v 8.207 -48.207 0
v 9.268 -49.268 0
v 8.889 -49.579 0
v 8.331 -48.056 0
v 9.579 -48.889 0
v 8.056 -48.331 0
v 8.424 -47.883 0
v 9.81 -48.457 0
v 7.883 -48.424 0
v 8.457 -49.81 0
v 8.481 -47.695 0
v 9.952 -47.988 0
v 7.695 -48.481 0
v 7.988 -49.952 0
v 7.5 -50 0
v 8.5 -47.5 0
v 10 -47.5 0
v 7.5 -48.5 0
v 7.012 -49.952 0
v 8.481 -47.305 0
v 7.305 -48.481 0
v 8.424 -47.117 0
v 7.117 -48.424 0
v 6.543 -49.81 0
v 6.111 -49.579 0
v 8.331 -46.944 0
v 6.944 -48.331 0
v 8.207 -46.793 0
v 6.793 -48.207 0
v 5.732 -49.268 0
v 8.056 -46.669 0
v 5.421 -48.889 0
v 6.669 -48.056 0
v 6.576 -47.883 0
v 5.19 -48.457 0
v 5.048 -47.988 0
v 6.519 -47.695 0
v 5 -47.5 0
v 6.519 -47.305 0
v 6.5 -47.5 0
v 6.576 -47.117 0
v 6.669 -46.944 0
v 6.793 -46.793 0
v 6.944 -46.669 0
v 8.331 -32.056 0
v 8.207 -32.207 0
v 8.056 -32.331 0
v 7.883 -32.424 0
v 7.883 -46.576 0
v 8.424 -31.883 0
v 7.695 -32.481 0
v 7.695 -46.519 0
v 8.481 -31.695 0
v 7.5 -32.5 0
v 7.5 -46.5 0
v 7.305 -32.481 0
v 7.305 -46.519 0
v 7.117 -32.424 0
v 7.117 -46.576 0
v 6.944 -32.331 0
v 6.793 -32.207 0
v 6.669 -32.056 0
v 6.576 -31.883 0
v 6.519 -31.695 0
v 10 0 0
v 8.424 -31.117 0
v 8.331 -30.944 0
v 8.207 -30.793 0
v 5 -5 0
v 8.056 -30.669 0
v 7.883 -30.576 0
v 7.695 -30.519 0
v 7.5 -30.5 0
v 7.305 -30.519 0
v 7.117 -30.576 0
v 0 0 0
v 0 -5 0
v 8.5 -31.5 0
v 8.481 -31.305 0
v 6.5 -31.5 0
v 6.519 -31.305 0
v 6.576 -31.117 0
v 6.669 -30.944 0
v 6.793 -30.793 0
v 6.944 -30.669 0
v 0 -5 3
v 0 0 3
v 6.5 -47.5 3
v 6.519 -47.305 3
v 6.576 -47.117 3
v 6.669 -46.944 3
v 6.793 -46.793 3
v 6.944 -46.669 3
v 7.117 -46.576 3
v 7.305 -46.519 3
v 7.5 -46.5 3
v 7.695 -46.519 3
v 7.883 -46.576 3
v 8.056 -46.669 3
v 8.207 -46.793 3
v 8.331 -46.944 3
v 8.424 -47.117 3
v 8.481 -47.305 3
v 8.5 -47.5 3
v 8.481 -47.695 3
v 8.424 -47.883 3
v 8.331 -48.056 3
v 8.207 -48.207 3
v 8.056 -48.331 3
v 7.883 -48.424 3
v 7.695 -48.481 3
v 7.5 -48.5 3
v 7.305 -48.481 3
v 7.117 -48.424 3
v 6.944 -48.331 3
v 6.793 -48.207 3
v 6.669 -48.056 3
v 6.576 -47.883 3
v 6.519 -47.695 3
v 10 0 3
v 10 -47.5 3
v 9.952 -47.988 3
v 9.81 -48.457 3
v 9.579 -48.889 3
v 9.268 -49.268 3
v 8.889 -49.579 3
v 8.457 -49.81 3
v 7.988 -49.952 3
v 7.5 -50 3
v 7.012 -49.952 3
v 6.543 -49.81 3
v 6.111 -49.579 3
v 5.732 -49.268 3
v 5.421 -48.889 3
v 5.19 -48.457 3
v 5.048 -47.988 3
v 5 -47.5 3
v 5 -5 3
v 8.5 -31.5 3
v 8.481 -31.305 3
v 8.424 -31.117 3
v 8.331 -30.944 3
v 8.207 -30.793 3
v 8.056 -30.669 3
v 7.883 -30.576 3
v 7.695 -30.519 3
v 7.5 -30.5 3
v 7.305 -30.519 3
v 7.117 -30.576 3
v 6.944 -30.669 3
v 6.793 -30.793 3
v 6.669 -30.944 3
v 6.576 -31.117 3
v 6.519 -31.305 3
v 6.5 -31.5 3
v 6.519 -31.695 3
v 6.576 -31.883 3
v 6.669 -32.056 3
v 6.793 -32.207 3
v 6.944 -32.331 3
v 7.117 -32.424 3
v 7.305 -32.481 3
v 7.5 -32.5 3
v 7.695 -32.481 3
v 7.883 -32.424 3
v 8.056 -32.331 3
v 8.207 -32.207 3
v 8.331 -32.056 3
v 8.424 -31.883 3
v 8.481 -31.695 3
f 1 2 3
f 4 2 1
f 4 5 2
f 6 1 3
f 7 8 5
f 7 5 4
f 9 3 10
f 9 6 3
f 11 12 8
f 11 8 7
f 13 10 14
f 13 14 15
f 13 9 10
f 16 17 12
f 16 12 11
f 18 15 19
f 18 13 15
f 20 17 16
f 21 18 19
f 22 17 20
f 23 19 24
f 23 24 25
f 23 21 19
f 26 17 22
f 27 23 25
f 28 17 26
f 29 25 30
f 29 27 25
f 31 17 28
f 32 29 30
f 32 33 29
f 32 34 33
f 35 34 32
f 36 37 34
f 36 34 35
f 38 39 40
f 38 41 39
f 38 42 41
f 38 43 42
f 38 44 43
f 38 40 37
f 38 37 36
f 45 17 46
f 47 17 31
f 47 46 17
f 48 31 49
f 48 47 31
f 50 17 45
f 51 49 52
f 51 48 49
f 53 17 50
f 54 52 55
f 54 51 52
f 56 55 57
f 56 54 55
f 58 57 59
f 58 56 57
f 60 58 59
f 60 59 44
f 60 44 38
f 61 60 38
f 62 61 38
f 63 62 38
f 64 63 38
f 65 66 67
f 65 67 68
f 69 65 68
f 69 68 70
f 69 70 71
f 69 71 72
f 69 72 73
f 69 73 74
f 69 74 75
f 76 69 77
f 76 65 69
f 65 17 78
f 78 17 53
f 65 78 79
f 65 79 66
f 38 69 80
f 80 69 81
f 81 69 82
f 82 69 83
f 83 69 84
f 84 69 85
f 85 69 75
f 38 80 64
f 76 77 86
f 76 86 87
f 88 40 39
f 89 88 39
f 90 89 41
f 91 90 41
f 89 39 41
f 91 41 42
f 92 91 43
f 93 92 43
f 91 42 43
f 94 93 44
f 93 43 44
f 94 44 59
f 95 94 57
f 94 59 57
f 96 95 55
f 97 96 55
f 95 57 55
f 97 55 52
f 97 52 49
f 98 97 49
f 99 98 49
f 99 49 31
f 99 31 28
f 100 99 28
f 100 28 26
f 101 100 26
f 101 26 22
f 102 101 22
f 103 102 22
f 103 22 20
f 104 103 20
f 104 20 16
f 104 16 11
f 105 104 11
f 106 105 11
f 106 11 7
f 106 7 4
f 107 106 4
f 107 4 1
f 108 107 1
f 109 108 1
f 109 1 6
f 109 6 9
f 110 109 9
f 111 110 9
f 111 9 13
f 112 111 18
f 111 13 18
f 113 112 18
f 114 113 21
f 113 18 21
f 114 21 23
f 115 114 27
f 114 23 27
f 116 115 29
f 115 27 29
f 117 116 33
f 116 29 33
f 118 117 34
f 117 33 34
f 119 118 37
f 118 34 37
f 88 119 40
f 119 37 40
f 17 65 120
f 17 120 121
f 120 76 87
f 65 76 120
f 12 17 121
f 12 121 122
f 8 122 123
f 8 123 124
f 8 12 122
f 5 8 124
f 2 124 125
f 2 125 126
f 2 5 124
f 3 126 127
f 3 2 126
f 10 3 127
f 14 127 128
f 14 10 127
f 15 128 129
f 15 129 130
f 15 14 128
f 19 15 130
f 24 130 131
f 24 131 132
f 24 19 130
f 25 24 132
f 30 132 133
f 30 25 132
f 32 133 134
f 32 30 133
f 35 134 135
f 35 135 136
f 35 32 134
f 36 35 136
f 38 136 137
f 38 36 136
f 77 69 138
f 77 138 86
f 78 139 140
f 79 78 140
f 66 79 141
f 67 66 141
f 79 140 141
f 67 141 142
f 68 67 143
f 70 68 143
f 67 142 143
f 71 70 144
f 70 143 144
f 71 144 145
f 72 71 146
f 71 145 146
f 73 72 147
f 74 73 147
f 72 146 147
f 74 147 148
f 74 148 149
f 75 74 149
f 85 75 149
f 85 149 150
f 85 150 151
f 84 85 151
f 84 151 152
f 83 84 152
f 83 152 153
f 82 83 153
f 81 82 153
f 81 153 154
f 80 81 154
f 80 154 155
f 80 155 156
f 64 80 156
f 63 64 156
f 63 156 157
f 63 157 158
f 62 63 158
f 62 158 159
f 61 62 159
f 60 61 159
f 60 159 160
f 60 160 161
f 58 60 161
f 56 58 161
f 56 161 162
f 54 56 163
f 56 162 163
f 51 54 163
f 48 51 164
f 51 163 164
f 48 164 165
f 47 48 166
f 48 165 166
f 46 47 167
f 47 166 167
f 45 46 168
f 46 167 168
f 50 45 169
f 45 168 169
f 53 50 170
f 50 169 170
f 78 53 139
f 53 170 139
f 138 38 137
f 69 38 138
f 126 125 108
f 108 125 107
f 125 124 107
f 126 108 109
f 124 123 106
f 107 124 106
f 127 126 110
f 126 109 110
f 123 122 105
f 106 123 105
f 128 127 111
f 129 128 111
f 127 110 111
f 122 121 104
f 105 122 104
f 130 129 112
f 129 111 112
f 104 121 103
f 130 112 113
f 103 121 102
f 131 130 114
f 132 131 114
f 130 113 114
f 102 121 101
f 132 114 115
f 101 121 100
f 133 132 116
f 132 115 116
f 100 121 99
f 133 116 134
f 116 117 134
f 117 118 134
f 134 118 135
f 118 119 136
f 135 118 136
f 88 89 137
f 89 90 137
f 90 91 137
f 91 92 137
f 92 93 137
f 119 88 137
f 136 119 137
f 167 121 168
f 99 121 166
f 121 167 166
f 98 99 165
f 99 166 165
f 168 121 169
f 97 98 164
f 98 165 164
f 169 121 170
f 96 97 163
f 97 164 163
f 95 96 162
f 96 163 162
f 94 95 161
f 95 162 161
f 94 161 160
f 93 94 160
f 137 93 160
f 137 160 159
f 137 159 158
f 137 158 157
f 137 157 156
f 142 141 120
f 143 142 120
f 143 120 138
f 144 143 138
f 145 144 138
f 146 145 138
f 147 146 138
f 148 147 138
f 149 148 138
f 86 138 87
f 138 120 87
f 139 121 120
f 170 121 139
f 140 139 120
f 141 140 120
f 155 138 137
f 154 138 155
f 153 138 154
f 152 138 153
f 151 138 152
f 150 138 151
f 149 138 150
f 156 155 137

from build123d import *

# Parameters (mm, degrees)
BOSS_EXTRU_1_DEPTH      = 3
ESQUISSE3_R             = 1
ENL_V_MAT_EXTRU_1_DEPTH = 4
ESQUISSE4_R             = 1
ENL_V_MAT_EXTRU_2_DEPTH = 10


with BuildPart() as part:
    # Esquisse1 → Boss.-Extru.1 (new body)
    with BuildSketch(Plane.XY):
        with BuildLine():
            Line((0, 0), (10, 0))
            Line((10, 0), (10, -47.5))
            ThreePointArc((10, -47.5), (7.5, -50), (5, -47.5))
            Line((5, -47.5), (5, -5))
            Line((5, -5), (0, -5))
            Line((0, -5), (0, 0))
        make_face()
    extrude(amount=BOSS_EXTRU_1_DEPTH)

    # Esquisse3 → Enlèv. mat.-Extru.1 (cut)
    with BuildSketch(Plane(origin=(0, 0, 0), x_dir=(-1, 0, 0), z_dir=(0, 0, -1))):
        with Locations((-7.5, -47.5)):
            Circle(ESQUISSE3_R)
    extrude(amount=-ENL_V_MAT_EXTRU_1_DEPTH, mode=Mode.SUBTRACT)

    # Esquisse4 → Enlèv. mat.-Extru.2 (cut)
    with BuildSketch(Plane.XY.offset(3)):
        with Locations((7.5, -31.5)):
            Circle(ESQUISSE4_R)
    extrude(amount=-ENL_V_MAT_EXTRU_2_DEPTH, mode=Mode.SUBTRACT)


solid = part.part
